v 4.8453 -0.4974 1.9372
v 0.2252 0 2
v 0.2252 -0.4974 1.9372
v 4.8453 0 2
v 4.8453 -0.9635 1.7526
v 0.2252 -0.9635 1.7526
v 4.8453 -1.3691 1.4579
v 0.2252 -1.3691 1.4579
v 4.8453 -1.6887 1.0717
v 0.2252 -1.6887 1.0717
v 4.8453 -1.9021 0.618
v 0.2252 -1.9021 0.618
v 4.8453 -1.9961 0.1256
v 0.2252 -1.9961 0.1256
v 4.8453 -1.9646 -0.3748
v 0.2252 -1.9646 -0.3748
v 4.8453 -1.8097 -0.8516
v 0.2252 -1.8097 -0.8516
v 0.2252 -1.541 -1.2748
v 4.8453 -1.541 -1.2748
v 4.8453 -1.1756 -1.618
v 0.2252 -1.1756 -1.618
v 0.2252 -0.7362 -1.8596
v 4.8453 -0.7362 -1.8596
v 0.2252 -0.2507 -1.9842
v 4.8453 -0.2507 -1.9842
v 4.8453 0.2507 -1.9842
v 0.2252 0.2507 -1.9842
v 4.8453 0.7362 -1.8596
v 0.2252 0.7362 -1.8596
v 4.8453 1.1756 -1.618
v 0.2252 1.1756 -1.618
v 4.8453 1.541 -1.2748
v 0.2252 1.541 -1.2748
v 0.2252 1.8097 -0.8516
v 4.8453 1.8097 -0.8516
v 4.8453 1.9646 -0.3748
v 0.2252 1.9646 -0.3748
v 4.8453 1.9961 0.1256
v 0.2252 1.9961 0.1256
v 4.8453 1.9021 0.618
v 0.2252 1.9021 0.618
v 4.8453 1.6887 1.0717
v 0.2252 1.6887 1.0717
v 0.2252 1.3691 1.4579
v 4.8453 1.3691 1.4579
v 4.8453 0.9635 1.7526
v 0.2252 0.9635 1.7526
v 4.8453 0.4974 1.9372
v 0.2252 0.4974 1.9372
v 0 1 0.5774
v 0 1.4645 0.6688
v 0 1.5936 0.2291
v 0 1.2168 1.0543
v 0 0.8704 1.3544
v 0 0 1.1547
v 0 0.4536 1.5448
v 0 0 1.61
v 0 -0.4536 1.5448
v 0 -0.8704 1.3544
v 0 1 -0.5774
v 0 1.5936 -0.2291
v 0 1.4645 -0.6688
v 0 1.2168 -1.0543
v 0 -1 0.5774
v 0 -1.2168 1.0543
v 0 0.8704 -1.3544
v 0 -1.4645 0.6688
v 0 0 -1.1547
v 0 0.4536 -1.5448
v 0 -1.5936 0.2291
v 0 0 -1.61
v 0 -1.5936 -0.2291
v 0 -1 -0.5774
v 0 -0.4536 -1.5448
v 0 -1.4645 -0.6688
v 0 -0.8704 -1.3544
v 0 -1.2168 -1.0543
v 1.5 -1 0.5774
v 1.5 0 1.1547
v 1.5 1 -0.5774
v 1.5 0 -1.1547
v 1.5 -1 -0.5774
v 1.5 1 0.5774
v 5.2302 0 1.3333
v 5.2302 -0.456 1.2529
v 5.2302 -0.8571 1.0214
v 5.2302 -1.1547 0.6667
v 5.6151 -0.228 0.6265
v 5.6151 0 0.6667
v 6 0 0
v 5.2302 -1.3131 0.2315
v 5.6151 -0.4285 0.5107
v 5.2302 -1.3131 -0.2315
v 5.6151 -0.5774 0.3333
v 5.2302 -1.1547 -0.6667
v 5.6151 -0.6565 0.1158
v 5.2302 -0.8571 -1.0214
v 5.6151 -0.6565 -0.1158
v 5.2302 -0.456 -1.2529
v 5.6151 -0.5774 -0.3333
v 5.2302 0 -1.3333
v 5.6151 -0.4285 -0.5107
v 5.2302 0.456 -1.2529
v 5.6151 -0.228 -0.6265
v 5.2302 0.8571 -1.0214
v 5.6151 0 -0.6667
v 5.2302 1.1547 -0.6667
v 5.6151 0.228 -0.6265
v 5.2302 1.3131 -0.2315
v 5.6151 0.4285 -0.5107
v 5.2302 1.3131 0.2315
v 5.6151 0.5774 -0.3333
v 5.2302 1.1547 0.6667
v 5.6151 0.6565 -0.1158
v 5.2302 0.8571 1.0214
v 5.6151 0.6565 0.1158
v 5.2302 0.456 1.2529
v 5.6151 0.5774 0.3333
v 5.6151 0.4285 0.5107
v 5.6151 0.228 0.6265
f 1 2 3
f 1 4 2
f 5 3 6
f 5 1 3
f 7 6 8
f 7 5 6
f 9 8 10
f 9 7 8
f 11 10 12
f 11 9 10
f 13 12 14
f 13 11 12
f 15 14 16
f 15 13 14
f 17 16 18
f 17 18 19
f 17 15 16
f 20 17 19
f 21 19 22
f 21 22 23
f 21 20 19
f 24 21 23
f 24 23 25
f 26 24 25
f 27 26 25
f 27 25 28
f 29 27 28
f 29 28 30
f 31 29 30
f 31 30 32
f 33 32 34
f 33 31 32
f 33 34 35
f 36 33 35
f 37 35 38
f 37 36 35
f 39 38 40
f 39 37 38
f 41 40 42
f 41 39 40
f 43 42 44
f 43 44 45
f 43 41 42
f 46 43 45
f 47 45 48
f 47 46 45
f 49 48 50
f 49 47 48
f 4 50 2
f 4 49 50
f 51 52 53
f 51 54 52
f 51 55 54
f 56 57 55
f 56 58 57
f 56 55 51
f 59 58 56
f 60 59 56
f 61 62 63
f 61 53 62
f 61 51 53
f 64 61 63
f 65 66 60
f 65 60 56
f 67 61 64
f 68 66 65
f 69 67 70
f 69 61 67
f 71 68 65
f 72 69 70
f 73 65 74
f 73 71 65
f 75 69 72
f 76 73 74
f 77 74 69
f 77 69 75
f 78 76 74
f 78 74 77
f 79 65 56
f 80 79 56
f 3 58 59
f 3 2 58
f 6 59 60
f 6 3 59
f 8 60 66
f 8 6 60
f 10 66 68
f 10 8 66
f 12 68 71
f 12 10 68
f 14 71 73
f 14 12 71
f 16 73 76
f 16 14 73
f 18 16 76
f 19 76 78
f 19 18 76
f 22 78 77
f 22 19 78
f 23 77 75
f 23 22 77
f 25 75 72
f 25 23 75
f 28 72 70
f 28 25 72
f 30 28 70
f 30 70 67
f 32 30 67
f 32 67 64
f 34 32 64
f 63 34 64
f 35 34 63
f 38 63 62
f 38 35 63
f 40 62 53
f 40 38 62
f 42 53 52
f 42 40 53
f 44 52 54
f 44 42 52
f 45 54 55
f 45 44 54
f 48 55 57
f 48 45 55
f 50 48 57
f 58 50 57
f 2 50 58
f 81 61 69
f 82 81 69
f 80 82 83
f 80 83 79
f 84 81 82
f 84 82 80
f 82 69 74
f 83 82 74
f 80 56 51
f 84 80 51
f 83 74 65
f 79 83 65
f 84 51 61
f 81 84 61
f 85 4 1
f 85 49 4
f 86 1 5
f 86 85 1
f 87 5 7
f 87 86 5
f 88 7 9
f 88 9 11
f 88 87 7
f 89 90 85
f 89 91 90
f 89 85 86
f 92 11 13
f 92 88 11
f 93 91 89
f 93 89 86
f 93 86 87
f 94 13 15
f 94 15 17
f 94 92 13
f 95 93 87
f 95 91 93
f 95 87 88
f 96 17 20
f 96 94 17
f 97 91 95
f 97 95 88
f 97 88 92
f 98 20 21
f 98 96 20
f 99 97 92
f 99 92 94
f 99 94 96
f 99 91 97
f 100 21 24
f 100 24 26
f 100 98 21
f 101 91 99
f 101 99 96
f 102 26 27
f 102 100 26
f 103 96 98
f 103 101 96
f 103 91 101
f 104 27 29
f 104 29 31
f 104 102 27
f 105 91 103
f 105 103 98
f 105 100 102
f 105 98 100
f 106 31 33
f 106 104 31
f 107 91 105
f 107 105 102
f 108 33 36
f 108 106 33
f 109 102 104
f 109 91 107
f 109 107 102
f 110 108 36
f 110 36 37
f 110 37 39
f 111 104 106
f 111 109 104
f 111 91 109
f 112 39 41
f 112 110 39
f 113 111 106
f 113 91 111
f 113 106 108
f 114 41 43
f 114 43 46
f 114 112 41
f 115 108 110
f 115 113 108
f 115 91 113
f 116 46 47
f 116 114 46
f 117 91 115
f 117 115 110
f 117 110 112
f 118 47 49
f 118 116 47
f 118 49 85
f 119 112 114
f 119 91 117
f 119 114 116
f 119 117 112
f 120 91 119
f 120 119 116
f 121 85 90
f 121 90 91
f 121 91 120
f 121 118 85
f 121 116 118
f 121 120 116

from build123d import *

# Parameters (mm, degrees)
HEX_2_DEPTH = 1.5


with BuildPart() as part:
    # BodySke → BaseBody (revolve)
    with BuildSketch(Plane.XY, mode=Mode.PRIVATE) as basebody_sk:
        Polygon((0, 0), (0, 1.61), (0.225166605, 2), (4.845299462, 2), (6, 0), align=None)
    revolve(basebody_sk.sketch.rotate(Axis((-12.7, 0, 0), (1, 0, 0)), 90), axis=Axis((-12.7, 0, 0), (1, 0, 0)))  # turned: the seam where the file's is

    # Sketch2 → Hex 2 (cut)
    with BuildSketch(Plane.ZY):
        Polygon((0.577350269, 1), (-0.577350269, 1), (-1.154700538, 0), (-0.577350269, -1), (0.577350269, -1), (1.154700538, 0), align=None)
    extrude(amount=-HEX_2_DEPTH, mode=Mode.SUBTRACT)


solid = part.part
